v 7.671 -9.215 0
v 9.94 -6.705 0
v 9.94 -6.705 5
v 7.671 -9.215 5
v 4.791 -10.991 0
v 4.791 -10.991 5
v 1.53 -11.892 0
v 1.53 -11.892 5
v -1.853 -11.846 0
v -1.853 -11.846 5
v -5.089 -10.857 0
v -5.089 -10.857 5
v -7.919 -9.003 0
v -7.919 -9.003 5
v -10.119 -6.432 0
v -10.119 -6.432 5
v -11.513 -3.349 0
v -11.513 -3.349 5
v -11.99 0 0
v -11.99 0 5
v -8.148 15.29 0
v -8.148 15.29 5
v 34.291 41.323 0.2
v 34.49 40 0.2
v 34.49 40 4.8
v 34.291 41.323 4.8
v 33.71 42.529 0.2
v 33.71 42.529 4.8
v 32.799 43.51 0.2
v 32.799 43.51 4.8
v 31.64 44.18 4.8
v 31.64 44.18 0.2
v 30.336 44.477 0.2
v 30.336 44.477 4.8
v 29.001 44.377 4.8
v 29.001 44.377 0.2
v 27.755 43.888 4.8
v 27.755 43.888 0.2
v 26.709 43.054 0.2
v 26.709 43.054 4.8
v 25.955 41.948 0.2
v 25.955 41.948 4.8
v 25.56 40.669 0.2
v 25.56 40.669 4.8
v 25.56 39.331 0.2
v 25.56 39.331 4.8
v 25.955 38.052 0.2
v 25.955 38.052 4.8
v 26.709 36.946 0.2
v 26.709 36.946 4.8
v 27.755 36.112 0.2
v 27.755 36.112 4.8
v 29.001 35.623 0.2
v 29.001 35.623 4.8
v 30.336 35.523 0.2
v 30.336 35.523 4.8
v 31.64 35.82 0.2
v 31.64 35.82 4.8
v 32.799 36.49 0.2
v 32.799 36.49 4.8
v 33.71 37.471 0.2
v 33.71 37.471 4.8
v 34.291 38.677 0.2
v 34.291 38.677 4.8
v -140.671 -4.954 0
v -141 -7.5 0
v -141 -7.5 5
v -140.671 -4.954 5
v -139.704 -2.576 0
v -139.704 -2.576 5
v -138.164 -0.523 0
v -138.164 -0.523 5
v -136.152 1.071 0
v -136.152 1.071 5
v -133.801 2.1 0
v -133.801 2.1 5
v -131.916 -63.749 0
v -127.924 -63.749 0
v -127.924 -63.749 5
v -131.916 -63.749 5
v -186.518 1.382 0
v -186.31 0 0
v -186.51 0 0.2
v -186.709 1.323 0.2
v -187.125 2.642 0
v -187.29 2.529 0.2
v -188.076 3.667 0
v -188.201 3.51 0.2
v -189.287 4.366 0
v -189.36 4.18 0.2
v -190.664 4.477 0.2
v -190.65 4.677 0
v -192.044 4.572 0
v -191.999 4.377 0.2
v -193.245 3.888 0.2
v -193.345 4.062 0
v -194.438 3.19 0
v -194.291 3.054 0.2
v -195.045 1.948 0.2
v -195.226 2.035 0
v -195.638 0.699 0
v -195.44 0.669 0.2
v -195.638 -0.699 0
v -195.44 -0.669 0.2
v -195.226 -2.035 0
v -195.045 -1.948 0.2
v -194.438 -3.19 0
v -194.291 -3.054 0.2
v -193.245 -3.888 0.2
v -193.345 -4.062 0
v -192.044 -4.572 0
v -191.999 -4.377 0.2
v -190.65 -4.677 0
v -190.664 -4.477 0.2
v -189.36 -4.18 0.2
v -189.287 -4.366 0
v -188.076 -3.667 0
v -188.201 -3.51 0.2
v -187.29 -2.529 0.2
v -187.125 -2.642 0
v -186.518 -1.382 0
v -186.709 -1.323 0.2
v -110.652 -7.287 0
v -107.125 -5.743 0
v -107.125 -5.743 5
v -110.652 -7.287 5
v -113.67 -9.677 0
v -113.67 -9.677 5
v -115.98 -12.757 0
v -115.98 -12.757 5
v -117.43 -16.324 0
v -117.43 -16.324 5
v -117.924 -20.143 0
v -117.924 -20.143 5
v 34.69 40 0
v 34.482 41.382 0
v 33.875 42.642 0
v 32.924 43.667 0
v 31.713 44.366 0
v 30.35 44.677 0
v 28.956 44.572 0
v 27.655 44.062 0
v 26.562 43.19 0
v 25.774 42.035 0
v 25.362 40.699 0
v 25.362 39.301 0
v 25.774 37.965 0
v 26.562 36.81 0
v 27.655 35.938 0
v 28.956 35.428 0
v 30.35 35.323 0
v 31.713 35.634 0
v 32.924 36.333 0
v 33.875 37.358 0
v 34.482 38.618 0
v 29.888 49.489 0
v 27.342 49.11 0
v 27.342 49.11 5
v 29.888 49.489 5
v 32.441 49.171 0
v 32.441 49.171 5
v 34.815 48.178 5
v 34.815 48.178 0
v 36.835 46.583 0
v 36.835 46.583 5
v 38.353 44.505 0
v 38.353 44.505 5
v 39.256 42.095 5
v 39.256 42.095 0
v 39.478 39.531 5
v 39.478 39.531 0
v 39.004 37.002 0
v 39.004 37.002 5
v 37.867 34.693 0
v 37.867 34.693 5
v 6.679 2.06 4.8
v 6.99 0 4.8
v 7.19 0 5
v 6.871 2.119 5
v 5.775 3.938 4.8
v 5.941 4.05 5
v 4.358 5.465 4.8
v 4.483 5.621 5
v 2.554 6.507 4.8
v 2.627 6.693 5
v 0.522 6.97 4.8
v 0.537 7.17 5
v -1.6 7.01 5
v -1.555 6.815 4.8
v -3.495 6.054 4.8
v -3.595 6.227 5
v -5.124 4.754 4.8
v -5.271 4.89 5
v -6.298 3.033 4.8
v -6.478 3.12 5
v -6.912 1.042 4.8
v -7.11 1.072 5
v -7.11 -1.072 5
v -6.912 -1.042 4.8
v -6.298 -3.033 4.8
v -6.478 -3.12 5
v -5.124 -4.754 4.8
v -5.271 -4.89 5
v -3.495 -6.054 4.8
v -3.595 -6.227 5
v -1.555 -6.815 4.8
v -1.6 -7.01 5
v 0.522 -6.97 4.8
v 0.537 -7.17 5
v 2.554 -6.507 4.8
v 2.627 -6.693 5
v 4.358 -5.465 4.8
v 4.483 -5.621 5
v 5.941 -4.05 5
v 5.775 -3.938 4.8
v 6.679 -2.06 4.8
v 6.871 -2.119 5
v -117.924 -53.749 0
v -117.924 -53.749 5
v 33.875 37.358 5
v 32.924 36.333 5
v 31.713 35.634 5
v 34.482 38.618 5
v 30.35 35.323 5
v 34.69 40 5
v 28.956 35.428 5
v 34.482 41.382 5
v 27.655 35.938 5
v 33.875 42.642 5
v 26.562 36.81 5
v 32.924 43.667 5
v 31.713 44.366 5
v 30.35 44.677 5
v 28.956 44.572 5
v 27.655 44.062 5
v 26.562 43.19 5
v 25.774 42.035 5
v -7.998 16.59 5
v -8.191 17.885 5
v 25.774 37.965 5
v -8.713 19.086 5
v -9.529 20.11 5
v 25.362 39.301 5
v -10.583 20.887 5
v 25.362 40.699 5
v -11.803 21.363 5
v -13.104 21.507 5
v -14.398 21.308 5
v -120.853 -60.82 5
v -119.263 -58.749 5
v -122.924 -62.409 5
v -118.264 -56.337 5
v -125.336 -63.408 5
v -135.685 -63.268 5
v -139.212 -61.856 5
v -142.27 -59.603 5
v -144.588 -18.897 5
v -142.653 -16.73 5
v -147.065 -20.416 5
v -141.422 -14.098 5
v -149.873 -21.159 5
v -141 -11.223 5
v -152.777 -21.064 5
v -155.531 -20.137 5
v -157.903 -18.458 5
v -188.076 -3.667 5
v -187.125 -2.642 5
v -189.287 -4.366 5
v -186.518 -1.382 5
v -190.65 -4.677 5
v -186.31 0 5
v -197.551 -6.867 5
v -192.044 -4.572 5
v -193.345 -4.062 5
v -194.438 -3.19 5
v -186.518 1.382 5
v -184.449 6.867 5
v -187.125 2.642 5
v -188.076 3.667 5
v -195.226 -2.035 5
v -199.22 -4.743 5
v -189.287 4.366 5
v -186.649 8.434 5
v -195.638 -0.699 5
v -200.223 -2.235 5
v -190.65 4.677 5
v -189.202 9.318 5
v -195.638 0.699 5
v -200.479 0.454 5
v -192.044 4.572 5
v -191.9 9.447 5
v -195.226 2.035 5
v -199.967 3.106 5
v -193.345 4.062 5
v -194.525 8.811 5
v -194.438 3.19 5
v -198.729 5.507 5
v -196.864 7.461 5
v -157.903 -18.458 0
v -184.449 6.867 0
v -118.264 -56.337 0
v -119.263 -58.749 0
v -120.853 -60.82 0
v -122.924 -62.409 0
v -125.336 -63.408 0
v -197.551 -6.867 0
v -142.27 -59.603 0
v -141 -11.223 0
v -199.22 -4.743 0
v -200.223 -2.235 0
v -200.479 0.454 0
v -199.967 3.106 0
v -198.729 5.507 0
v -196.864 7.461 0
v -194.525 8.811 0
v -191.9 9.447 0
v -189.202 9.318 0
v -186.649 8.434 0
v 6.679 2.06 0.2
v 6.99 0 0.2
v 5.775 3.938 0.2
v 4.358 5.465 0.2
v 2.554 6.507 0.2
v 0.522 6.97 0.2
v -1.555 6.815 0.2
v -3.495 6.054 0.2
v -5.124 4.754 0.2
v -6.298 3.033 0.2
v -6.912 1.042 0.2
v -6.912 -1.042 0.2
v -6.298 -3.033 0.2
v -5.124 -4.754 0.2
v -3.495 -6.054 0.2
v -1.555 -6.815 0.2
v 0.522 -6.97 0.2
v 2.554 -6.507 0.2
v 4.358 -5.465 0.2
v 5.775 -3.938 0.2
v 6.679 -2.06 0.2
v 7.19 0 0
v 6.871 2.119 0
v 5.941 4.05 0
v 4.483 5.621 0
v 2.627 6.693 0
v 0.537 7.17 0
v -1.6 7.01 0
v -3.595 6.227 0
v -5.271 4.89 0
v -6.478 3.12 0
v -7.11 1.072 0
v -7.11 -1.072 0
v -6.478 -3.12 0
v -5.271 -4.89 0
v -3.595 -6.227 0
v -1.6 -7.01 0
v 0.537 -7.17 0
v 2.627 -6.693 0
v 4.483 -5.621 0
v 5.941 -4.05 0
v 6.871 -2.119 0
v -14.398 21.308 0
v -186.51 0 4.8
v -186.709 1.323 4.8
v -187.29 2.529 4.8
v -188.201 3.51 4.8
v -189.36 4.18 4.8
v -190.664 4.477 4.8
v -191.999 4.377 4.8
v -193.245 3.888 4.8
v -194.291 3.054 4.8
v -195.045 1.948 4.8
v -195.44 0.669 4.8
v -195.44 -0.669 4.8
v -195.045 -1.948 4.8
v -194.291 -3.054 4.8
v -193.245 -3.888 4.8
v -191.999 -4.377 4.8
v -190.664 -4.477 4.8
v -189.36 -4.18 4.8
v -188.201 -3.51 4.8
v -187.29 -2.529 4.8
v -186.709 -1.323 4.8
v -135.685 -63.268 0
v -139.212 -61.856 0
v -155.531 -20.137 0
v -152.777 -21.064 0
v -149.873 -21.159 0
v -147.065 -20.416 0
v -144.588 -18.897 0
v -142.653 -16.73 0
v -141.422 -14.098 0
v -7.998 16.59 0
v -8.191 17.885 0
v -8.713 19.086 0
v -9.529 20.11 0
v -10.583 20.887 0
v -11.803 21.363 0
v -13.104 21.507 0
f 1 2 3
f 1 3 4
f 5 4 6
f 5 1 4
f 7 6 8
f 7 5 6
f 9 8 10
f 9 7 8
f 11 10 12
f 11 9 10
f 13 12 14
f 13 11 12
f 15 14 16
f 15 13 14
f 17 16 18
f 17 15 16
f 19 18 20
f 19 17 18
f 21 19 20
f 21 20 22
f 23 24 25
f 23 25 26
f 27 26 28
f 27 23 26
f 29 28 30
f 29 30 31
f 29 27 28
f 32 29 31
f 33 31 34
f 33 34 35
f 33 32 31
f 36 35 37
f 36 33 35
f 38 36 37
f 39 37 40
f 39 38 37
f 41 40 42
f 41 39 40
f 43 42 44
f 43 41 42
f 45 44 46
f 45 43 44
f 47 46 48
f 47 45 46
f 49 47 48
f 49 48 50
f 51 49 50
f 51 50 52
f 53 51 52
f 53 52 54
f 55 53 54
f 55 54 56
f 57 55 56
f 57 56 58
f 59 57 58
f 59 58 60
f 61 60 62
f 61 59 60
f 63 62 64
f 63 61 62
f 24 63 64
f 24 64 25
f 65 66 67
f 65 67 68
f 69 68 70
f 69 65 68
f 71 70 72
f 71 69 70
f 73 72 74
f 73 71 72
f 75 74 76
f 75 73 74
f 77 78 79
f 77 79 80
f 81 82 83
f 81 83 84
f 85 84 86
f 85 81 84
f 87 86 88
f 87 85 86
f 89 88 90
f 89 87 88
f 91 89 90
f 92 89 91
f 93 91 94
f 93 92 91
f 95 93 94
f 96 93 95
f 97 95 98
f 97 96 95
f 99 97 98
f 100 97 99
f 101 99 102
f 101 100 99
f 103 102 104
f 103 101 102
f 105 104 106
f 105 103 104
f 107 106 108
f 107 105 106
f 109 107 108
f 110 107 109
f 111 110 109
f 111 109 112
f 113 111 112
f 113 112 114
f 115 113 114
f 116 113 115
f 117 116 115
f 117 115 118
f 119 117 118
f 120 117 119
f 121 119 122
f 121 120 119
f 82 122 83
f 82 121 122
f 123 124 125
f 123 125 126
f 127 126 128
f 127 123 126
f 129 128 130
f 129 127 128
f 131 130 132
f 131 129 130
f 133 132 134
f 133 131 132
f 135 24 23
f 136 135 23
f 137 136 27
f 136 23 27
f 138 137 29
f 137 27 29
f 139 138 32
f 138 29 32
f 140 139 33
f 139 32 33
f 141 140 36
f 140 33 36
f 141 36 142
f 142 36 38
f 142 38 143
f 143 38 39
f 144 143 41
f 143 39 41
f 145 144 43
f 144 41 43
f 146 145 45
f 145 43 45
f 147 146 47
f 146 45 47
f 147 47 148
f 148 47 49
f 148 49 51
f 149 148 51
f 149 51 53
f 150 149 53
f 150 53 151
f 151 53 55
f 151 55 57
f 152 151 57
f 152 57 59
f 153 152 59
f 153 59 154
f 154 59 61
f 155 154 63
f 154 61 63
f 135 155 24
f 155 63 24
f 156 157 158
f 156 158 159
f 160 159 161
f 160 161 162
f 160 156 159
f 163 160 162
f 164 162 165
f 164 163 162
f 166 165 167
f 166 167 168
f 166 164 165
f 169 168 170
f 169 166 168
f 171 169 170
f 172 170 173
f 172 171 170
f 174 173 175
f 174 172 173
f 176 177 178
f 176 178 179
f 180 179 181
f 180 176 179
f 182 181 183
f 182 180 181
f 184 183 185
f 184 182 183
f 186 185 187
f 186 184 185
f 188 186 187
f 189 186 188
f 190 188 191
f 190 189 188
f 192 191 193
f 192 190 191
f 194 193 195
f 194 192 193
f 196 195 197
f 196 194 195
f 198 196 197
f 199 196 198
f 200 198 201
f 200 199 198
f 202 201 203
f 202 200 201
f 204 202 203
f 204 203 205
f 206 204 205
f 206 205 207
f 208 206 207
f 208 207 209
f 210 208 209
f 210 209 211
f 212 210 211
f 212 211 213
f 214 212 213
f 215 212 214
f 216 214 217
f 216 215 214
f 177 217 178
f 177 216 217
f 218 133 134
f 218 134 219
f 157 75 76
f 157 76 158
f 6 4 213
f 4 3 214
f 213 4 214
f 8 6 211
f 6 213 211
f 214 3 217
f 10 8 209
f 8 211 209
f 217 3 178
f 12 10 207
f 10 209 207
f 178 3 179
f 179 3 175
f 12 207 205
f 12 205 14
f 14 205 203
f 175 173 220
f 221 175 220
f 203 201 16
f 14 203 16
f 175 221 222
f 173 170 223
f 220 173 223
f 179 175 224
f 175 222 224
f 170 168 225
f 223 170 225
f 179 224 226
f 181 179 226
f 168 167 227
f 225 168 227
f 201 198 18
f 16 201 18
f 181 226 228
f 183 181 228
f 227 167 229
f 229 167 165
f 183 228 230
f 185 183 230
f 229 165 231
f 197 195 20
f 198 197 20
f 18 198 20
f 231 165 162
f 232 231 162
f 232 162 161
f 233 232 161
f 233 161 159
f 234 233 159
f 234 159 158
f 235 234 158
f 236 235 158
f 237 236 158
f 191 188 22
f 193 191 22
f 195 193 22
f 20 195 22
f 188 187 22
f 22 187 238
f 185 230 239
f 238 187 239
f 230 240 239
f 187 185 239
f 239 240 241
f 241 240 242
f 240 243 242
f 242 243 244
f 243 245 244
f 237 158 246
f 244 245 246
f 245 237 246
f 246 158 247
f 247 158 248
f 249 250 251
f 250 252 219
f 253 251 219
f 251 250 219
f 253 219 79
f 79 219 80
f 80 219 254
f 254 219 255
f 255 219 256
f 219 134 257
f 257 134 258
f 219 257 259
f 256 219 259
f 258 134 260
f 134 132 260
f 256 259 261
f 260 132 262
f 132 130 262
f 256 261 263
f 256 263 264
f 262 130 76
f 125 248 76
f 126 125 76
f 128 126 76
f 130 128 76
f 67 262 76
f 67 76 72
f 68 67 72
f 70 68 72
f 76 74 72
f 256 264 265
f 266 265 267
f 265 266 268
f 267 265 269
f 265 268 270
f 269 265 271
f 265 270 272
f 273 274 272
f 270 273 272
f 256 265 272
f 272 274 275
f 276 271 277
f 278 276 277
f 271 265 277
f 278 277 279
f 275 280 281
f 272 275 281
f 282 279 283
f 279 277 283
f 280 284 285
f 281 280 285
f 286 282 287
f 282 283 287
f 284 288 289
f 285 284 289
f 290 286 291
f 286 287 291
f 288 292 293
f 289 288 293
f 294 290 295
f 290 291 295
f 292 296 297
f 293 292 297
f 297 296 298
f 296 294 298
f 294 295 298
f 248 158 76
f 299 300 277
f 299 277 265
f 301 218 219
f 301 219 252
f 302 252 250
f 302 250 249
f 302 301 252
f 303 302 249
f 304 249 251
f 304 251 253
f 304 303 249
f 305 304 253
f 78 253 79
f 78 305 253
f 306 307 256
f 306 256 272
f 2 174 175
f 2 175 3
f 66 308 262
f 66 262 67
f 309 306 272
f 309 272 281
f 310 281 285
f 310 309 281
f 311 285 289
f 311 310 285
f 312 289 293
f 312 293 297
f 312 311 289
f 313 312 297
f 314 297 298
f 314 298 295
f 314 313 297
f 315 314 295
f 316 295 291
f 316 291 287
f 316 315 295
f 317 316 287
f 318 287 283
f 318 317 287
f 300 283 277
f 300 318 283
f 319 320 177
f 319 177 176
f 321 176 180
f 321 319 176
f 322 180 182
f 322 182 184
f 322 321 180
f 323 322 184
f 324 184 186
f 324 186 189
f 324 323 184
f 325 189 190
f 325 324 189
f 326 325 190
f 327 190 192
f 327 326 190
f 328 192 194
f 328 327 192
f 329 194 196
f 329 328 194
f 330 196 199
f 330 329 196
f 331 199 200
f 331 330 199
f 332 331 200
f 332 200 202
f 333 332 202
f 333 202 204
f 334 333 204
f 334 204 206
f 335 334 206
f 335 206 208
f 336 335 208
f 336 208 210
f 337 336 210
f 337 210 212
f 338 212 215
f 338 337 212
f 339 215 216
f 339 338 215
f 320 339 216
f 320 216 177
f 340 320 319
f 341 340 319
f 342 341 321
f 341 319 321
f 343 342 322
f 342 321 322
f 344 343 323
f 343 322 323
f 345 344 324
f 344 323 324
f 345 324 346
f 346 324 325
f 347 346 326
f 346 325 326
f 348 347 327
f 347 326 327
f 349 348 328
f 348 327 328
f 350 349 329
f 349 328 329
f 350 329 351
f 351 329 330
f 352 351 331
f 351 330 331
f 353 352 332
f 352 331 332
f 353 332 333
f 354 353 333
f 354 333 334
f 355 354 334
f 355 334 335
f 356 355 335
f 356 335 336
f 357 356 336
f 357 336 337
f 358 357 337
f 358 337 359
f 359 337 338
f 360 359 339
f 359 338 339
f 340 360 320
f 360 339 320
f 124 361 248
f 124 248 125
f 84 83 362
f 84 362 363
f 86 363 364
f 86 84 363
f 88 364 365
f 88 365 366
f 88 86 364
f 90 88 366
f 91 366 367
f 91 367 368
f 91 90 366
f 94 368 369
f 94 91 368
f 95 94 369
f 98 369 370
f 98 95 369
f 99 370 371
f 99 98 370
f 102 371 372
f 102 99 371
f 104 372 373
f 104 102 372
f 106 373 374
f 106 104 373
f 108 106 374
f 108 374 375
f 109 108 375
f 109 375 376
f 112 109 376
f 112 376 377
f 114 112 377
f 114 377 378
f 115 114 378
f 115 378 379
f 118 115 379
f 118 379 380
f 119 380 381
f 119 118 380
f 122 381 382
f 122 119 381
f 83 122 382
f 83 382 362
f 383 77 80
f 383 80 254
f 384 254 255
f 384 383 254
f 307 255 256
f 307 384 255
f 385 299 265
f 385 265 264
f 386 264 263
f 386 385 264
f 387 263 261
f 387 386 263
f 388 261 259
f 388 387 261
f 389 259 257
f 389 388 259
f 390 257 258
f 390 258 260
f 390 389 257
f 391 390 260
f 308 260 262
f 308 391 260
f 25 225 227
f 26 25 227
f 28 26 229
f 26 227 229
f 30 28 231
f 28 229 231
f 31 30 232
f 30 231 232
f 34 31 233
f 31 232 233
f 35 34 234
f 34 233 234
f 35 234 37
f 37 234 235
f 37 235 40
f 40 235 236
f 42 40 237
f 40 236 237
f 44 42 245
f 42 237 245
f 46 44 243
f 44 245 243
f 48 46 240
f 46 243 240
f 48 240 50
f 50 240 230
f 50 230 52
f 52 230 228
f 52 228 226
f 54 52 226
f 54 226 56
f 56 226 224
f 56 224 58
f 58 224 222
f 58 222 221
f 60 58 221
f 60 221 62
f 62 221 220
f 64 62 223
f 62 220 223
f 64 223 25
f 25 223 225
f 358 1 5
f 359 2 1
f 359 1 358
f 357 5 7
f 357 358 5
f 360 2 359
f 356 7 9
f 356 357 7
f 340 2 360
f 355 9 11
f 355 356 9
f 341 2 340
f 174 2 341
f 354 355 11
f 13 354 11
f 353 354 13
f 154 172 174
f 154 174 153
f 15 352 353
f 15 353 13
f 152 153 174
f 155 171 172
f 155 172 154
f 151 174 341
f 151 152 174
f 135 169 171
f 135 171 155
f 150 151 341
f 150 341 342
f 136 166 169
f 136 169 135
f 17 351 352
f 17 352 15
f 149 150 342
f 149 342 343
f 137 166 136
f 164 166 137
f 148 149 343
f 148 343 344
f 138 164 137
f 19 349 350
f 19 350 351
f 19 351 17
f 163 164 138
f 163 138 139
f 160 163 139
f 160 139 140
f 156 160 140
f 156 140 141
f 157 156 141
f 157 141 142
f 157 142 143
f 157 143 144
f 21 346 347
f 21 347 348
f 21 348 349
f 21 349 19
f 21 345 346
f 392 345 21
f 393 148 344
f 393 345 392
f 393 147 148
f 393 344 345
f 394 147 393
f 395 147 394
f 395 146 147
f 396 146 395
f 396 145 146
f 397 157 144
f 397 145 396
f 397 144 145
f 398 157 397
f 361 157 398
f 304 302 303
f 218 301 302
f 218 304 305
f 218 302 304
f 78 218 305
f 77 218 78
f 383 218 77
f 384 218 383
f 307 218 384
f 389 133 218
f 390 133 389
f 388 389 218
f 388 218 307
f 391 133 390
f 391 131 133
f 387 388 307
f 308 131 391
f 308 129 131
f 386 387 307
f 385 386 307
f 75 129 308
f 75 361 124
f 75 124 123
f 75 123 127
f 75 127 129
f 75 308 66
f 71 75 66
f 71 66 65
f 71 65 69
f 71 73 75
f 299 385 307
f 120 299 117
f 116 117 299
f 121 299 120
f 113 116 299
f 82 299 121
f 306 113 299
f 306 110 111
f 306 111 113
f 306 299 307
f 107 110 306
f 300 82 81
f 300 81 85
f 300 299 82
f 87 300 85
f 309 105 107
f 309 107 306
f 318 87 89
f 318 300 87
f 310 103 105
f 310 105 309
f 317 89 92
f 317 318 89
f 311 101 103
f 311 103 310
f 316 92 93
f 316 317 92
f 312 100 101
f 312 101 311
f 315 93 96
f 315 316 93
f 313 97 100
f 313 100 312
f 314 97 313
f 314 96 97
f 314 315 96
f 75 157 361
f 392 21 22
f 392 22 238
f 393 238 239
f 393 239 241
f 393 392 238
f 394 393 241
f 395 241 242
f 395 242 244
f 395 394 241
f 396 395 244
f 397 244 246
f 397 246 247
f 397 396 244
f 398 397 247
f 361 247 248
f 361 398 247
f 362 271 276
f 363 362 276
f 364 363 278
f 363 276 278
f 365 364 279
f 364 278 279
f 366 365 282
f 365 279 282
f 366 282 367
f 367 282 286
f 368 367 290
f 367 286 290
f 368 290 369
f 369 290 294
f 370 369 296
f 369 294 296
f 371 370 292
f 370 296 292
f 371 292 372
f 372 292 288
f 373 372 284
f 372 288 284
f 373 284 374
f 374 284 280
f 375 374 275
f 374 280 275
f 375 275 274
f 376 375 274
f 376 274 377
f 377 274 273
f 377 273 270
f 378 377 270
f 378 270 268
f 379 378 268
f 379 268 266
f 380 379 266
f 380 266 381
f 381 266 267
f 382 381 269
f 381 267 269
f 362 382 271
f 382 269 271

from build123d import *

# Parameters (mm, degrees)
SKETCH1_R           = 6.99
SKETCH1_R_2         = 4.49
BOSS_EXTRUDE1_DEPTH = 5
CHAMFER1_SIZE       = 0.2
CHAMFER2_SIZE       = 0.2
CHAMFER3_SIZE       = 0.2


with BuildPart() as part:
    # Sketch1 → Boss-Extrude1 (new body)
    with BuildSketch(Plane.XY):
        with BuildLine():
            Line((-133.800547442, 2.100285816), (27.342280478, 49.110248457))
            ThreePointArc((27.342280478, 49.110248457), (37.664916823, 45.595457988), (37.867204061, 34.692721954))
            Line((37.867204061, 34.692721954), (9.939702497, -6.705401873))
            ThreePointArc((9.939702497, -6.705401873), (-3.505928341, -11.465974292), (-11.99, 0))
            Line((-11.99, 0), (-8.148421767, 15.289860915))
            ThreePointArc((-8.148421767, 15.289860915), (-9.52943302, 20.109783701), (-14.397978323, 21.308163599))
            Line((-14.397978323, 21.308163599), (-107.124555833, -5.742825892))
            ThreePointArc((-107.124555833, -5.742825892), (-114.923991281, -11.142928518), (-117.92373467, -20.142586361))
            Line((-117.92373467, -20.142586361), (-117.92373467, -53.749229456))
            ThreePointArc((-117.92373467, -53.749229456), (-120.852666858, -60.820297268), (-127.92373467, -63.749229456))
            Line((-127.92373467, -63.749229456), (-131.916457627, -63.749229456))
            ThreePointArc((-131.916457627, -63.749229456), (-137.493140936, -62.674049142), (-142.270365562, -59.602643226))
            Line((-142.270365562, -59.602643226), (-197.550572421, -6.866593112))
            ThreePointArc((-197.550572421, -6.866593112), (-197.866593112, 6.550572421), (-184.449427579, 6.866593112))
            Line((-184.449427579, 6.866593112), (-157.90260529, -18.4584668))
            ThreePointArc((-157.90260529, -18.4584668), (-147.064650772, -20.415954294), (-141, -11.22285762))
            Line((-141, -11.22285762), (-141, -7.499554497))
            ThreePointArc((-141, -7.499554497), (-139.000171074, -1.499782602), (-133.800547442, 2.100285816))
        make_face()
        Circle(SKETCH1_R, mode=Mode.SUBTRACT)
        with Locations((-191, 0)):
            Circle(SKETCH1_R_2, mode=Mode.SUBTRACT)
        with Locations((30, 40)):
            Circle(SKETCH1_R_2, mode=Mode.SUBTRACT)
    extrude(amount=BOSS_EXTRUDE1_DEPTH)

    # Chamfer1
    chamfer1_edges = [part.edges().sort_by_distance(p)[0] for p in [
        (-195.49, 0, 0),
        (-195.49, 0, 5),
    ]]
    chamfer(chamfer1_edges, length=CHAMFER1_SIZE)

    # Chamfer2
    chamfer2_edges = [part.edges().sort_by_distance(p)[0] for p in [
        (-6.99, 0, 0),
        (-6.99, 0, 5),
    ]]
    chamfer(chamfer2_edges, length=CHAMFER2_SIZE)

    # Chamfer3
    chamfer3_edges = [part.edges().sort_by_distance(p)[0] for p in [
        (25.51, 40, 0),
        (25.51, 40, 5),
    ]]
    chamfer(chamfer3_edges, length=CHAMFER3_SIZE)


solid = part.part
